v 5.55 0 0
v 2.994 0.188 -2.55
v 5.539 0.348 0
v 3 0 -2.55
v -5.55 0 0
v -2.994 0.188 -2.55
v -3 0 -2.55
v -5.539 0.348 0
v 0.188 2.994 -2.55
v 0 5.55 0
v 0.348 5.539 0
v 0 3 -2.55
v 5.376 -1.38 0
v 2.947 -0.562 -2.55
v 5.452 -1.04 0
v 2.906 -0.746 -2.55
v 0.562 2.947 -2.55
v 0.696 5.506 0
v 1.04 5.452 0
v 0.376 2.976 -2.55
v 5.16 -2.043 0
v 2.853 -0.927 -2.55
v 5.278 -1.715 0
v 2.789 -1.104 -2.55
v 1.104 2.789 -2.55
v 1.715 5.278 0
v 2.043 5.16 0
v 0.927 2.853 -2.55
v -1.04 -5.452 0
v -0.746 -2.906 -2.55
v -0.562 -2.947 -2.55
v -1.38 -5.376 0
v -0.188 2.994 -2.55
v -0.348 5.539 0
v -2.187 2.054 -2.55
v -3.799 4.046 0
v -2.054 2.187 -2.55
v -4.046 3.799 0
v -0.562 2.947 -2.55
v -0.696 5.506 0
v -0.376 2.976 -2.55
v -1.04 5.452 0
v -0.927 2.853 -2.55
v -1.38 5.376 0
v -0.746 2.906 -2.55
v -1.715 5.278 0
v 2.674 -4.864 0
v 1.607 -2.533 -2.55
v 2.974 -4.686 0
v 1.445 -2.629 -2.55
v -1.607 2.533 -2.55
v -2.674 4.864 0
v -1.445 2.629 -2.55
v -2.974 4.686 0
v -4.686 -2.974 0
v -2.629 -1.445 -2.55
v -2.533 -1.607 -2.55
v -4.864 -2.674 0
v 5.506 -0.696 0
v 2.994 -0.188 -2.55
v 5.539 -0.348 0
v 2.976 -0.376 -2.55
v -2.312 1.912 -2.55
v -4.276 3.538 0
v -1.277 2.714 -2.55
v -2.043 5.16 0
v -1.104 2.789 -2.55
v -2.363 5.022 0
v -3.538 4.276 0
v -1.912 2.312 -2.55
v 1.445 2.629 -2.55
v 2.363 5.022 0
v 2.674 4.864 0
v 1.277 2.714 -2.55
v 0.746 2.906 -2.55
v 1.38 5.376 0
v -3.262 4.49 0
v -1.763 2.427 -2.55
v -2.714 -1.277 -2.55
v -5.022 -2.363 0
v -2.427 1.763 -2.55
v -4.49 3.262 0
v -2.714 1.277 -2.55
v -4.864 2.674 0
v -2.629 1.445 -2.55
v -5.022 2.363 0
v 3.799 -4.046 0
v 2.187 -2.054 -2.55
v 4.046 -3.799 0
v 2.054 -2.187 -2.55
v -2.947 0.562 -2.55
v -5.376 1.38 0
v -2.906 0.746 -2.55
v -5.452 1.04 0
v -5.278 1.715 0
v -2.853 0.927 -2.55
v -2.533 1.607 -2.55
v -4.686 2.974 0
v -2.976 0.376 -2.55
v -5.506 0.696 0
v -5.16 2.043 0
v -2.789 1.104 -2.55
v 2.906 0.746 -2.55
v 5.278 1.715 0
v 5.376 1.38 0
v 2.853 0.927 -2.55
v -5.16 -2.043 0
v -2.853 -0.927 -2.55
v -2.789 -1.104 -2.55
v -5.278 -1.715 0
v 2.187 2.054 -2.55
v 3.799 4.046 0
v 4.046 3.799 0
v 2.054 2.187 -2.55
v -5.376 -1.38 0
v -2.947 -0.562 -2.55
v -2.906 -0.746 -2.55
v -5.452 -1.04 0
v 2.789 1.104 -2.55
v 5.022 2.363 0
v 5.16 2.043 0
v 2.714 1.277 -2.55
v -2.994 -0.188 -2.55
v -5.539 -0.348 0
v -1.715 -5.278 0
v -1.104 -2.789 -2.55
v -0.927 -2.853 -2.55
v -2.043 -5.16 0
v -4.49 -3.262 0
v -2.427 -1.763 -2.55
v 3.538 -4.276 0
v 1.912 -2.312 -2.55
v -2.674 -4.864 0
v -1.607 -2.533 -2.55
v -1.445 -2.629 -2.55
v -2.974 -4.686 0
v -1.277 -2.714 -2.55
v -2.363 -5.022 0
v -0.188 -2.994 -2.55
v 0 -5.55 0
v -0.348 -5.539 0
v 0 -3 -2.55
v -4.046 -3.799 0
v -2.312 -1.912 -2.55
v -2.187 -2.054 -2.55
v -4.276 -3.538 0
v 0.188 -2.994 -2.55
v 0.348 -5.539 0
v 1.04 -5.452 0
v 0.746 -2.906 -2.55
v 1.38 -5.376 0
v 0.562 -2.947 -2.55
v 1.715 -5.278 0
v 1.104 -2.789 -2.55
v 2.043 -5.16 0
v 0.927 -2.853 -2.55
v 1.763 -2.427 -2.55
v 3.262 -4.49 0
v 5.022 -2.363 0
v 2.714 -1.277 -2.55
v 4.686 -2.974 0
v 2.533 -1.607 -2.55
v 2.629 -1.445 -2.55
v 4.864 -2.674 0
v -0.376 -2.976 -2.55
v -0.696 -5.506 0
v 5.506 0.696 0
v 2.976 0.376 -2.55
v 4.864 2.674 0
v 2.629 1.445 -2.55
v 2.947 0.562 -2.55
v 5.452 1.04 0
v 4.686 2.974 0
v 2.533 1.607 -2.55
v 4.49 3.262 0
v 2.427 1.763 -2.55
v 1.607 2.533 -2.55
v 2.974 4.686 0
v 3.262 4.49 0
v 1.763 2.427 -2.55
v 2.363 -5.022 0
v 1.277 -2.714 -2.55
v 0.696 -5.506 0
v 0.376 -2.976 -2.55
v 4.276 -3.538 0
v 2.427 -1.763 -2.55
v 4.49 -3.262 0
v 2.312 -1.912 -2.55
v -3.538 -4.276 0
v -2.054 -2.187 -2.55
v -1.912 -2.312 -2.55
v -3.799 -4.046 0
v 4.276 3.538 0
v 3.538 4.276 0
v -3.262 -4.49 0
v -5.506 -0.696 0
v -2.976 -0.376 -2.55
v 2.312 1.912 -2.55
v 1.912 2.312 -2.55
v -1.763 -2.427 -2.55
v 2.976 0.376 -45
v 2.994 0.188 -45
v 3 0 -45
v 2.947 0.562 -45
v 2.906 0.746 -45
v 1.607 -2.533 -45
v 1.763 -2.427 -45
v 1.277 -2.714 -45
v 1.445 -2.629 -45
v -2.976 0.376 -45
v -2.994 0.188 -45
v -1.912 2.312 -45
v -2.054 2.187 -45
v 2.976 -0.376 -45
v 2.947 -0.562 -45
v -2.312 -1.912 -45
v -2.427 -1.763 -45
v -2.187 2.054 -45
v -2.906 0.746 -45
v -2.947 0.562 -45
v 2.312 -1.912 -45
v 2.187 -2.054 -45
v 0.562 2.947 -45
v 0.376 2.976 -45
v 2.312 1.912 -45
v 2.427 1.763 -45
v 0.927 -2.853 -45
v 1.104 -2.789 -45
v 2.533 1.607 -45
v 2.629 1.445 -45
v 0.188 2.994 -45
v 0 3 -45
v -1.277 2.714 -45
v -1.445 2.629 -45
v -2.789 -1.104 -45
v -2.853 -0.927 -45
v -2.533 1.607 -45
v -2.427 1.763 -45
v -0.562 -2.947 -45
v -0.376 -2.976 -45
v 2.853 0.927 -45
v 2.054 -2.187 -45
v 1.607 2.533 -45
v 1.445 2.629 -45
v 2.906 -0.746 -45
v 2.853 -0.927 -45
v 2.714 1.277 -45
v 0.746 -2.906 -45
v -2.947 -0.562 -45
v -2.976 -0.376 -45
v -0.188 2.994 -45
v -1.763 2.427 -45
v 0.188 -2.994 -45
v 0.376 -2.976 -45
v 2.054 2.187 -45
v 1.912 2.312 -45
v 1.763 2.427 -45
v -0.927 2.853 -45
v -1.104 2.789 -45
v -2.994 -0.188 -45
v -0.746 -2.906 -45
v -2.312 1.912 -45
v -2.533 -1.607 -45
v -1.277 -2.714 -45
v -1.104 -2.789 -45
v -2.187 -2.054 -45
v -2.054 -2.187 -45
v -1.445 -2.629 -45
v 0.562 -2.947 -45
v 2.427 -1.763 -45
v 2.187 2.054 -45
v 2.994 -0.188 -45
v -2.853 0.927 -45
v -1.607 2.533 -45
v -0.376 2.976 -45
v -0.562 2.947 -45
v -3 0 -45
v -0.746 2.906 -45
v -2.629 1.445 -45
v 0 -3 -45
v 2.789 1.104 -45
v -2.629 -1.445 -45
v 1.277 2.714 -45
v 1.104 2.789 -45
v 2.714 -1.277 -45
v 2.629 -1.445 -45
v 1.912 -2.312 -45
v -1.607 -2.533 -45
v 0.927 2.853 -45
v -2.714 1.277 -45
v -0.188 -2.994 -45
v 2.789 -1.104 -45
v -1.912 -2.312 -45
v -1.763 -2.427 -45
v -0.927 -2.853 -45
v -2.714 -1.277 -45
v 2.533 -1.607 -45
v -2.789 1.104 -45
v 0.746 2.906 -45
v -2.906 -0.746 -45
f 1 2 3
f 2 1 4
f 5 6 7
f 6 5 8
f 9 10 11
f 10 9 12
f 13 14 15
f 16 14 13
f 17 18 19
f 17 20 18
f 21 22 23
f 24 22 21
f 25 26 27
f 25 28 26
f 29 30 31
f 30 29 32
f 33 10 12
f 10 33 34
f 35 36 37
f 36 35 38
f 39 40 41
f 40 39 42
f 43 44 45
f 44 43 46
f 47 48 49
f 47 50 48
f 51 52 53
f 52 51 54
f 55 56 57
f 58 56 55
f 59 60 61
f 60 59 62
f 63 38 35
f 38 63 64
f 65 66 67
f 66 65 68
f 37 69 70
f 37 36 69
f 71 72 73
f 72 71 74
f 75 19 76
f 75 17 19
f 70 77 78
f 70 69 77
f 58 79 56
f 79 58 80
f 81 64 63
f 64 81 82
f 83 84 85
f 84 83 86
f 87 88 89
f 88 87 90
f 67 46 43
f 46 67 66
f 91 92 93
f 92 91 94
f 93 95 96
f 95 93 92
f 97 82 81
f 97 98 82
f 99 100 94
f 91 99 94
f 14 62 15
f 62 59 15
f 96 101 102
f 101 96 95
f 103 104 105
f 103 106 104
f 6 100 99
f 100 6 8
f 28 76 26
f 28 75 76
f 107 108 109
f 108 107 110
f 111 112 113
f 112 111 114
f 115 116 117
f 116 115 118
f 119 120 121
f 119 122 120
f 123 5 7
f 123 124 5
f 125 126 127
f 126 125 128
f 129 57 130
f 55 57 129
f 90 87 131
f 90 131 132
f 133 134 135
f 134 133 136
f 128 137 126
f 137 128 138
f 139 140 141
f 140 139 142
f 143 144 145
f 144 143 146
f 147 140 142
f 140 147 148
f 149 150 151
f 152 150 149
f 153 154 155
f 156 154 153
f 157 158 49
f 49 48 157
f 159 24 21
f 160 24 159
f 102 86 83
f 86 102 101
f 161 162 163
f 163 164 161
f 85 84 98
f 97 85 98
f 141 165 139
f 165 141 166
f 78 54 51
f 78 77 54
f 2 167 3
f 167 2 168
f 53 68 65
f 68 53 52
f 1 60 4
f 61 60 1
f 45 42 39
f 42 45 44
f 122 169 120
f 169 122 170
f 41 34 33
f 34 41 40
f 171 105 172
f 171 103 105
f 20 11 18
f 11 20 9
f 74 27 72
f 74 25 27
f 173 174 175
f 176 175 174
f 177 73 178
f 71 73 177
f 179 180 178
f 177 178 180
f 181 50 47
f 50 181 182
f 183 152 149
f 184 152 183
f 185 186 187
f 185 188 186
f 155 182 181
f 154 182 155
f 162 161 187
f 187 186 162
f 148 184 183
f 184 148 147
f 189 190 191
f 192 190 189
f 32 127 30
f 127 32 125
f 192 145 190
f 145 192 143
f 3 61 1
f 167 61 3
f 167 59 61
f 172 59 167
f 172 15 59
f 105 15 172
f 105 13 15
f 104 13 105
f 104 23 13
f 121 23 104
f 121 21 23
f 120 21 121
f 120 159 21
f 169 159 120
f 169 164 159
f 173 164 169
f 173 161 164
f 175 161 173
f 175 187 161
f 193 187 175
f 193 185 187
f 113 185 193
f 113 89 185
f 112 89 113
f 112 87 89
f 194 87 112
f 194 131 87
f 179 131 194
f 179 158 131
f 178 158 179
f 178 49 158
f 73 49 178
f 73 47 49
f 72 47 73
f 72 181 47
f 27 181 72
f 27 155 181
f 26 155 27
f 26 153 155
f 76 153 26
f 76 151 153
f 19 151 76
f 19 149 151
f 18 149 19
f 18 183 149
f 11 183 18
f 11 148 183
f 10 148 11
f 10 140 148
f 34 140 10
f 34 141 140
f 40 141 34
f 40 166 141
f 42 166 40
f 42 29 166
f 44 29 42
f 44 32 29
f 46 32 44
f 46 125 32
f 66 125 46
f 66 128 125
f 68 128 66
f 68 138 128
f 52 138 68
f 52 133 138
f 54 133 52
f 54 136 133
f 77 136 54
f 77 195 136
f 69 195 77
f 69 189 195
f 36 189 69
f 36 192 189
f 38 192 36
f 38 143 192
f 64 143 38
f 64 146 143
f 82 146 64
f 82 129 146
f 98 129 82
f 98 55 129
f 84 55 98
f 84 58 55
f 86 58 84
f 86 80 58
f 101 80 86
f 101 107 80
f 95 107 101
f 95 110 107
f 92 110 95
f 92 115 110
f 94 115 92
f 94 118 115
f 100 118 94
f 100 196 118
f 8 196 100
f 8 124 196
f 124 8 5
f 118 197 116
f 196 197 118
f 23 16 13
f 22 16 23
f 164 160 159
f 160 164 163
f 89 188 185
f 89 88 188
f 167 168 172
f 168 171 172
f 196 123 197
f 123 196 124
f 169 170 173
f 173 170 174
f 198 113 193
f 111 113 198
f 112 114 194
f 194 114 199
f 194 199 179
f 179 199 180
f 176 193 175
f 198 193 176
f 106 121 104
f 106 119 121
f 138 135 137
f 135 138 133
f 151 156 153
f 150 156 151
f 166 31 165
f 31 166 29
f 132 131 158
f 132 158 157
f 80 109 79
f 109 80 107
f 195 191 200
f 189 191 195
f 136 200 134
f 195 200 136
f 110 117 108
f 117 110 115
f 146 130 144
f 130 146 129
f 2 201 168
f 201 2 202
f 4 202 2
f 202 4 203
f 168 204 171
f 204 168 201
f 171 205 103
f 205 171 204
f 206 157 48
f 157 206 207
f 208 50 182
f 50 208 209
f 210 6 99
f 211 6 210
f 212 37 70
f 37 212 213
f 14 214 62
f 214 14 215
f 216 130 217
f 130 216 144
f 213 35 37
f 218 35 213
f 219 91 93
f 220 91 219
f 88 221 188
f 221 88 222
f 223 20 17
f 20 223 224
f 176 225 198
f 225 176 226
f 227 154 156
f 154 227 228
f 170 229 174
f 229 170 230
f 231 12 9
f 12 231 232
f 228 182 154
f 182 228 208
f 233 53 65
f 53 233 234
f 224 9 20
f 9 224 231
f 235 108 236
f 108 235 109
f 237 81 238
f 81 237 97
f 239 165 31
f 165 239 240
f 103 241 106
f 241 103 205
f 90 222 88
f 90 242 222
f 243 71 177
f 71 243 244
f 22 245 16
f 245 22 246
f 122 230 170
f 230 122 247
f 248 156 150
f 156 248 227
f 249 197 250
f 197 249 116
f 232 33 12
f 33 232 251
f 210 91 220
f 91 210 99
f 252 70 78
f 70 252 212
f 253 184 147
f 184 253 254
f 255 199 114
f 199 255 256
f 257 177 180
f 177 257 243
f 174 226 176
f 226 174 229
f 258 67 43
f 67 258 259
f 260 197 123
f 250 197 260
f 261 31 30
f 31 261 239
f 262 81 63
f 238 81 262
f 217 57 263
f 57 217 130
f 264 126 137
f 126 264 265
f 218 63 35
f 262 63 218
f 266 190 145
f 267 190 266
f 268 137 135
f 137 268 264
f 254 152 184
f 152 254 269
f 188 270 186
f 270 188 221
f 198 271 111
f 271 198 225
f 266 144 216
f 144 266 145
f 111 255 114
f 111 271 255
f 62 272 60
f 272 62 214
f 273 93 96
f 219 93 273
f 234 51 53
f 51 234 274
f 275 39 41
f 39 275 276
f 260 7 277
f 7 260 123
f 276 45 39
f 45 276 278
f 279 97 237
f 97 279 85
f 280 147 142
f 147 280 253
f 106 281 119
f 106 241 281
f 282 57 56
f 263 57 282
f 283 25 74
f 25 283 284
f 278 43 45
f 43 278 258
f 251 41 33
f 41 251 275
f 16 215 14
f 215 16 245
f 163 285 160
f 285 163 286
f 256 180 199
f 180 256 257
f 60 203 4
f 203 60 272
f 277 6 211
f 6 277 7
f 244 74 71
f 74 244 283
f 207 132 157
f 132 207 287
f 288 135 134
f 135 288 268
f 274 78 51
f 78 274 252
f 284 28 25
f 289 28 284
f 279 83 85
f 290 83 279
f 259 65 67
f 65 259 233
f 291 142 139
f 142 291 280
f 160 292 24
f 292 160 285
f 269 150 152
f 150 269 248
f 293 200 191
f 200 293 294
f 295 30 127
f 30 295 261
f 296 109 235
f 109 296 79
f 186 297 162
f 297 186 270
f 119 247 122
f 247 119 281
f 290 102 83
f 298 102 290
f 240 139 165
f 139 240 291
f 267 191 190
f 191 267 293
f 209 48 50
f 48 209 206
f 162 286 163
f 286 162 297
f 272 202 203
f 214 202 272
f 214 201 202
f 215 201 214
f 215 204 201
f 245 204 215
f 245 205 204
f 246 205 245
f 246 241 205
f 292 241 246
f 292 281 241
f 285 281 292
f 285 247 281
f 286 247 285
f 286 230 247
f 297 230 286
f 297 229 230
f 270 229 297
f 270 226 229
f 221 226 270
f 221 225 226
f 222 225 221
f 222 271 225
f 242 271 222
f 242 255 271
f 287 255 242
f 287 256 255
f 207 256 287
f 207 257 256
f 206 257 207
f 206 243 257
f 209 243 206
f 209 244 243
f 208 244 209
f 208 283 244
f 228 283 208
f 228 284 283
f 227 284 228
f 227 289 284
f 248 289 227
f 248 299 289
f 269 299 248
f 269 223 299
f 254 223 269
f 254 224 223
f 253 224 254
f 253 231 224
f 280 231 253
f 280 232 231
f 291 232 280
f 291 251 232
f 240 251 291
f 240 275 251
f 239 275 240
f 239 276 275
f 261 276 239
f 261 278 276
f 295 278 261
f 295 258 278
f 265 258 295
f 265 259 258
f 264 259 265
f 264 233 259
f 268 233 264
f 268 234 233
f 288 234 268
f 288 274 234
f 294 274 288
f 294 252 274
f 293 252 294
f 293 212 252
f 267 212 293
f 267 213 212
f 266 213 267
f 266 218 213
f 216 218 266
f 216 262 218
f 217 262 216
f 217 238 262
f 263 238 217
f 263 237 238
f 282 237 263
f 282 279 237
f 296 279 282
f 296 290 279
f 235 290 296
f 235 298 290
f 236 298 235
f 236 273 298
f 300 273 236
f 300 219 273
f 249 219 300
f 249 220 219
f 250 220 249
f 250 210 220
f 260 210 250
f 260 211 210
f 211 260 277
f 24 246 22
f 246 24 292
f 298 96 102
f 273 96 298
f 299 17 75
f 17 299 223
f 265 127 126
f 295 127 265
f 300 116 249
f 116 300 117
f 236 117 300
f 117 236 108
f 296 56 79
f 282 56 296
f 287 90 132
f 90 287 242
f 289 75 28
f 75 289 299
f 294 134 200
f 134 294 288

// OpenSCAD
$fn=100;

// M6
crew_head_diameter=(11.3+10.9)/2; // dk
crew_body_diameter=6;

screw_length=45;

// Head
translate([0, 0, -crew_head_diameter/2])
cylinder(h=crew_head_diameter/2,r1=0, r2=crew_head_diameter/2, center=false);

// Body
translate([0, 0, -screw_length])
cylinder(h=screw_length, d=crew_body_diameter, center=false);
